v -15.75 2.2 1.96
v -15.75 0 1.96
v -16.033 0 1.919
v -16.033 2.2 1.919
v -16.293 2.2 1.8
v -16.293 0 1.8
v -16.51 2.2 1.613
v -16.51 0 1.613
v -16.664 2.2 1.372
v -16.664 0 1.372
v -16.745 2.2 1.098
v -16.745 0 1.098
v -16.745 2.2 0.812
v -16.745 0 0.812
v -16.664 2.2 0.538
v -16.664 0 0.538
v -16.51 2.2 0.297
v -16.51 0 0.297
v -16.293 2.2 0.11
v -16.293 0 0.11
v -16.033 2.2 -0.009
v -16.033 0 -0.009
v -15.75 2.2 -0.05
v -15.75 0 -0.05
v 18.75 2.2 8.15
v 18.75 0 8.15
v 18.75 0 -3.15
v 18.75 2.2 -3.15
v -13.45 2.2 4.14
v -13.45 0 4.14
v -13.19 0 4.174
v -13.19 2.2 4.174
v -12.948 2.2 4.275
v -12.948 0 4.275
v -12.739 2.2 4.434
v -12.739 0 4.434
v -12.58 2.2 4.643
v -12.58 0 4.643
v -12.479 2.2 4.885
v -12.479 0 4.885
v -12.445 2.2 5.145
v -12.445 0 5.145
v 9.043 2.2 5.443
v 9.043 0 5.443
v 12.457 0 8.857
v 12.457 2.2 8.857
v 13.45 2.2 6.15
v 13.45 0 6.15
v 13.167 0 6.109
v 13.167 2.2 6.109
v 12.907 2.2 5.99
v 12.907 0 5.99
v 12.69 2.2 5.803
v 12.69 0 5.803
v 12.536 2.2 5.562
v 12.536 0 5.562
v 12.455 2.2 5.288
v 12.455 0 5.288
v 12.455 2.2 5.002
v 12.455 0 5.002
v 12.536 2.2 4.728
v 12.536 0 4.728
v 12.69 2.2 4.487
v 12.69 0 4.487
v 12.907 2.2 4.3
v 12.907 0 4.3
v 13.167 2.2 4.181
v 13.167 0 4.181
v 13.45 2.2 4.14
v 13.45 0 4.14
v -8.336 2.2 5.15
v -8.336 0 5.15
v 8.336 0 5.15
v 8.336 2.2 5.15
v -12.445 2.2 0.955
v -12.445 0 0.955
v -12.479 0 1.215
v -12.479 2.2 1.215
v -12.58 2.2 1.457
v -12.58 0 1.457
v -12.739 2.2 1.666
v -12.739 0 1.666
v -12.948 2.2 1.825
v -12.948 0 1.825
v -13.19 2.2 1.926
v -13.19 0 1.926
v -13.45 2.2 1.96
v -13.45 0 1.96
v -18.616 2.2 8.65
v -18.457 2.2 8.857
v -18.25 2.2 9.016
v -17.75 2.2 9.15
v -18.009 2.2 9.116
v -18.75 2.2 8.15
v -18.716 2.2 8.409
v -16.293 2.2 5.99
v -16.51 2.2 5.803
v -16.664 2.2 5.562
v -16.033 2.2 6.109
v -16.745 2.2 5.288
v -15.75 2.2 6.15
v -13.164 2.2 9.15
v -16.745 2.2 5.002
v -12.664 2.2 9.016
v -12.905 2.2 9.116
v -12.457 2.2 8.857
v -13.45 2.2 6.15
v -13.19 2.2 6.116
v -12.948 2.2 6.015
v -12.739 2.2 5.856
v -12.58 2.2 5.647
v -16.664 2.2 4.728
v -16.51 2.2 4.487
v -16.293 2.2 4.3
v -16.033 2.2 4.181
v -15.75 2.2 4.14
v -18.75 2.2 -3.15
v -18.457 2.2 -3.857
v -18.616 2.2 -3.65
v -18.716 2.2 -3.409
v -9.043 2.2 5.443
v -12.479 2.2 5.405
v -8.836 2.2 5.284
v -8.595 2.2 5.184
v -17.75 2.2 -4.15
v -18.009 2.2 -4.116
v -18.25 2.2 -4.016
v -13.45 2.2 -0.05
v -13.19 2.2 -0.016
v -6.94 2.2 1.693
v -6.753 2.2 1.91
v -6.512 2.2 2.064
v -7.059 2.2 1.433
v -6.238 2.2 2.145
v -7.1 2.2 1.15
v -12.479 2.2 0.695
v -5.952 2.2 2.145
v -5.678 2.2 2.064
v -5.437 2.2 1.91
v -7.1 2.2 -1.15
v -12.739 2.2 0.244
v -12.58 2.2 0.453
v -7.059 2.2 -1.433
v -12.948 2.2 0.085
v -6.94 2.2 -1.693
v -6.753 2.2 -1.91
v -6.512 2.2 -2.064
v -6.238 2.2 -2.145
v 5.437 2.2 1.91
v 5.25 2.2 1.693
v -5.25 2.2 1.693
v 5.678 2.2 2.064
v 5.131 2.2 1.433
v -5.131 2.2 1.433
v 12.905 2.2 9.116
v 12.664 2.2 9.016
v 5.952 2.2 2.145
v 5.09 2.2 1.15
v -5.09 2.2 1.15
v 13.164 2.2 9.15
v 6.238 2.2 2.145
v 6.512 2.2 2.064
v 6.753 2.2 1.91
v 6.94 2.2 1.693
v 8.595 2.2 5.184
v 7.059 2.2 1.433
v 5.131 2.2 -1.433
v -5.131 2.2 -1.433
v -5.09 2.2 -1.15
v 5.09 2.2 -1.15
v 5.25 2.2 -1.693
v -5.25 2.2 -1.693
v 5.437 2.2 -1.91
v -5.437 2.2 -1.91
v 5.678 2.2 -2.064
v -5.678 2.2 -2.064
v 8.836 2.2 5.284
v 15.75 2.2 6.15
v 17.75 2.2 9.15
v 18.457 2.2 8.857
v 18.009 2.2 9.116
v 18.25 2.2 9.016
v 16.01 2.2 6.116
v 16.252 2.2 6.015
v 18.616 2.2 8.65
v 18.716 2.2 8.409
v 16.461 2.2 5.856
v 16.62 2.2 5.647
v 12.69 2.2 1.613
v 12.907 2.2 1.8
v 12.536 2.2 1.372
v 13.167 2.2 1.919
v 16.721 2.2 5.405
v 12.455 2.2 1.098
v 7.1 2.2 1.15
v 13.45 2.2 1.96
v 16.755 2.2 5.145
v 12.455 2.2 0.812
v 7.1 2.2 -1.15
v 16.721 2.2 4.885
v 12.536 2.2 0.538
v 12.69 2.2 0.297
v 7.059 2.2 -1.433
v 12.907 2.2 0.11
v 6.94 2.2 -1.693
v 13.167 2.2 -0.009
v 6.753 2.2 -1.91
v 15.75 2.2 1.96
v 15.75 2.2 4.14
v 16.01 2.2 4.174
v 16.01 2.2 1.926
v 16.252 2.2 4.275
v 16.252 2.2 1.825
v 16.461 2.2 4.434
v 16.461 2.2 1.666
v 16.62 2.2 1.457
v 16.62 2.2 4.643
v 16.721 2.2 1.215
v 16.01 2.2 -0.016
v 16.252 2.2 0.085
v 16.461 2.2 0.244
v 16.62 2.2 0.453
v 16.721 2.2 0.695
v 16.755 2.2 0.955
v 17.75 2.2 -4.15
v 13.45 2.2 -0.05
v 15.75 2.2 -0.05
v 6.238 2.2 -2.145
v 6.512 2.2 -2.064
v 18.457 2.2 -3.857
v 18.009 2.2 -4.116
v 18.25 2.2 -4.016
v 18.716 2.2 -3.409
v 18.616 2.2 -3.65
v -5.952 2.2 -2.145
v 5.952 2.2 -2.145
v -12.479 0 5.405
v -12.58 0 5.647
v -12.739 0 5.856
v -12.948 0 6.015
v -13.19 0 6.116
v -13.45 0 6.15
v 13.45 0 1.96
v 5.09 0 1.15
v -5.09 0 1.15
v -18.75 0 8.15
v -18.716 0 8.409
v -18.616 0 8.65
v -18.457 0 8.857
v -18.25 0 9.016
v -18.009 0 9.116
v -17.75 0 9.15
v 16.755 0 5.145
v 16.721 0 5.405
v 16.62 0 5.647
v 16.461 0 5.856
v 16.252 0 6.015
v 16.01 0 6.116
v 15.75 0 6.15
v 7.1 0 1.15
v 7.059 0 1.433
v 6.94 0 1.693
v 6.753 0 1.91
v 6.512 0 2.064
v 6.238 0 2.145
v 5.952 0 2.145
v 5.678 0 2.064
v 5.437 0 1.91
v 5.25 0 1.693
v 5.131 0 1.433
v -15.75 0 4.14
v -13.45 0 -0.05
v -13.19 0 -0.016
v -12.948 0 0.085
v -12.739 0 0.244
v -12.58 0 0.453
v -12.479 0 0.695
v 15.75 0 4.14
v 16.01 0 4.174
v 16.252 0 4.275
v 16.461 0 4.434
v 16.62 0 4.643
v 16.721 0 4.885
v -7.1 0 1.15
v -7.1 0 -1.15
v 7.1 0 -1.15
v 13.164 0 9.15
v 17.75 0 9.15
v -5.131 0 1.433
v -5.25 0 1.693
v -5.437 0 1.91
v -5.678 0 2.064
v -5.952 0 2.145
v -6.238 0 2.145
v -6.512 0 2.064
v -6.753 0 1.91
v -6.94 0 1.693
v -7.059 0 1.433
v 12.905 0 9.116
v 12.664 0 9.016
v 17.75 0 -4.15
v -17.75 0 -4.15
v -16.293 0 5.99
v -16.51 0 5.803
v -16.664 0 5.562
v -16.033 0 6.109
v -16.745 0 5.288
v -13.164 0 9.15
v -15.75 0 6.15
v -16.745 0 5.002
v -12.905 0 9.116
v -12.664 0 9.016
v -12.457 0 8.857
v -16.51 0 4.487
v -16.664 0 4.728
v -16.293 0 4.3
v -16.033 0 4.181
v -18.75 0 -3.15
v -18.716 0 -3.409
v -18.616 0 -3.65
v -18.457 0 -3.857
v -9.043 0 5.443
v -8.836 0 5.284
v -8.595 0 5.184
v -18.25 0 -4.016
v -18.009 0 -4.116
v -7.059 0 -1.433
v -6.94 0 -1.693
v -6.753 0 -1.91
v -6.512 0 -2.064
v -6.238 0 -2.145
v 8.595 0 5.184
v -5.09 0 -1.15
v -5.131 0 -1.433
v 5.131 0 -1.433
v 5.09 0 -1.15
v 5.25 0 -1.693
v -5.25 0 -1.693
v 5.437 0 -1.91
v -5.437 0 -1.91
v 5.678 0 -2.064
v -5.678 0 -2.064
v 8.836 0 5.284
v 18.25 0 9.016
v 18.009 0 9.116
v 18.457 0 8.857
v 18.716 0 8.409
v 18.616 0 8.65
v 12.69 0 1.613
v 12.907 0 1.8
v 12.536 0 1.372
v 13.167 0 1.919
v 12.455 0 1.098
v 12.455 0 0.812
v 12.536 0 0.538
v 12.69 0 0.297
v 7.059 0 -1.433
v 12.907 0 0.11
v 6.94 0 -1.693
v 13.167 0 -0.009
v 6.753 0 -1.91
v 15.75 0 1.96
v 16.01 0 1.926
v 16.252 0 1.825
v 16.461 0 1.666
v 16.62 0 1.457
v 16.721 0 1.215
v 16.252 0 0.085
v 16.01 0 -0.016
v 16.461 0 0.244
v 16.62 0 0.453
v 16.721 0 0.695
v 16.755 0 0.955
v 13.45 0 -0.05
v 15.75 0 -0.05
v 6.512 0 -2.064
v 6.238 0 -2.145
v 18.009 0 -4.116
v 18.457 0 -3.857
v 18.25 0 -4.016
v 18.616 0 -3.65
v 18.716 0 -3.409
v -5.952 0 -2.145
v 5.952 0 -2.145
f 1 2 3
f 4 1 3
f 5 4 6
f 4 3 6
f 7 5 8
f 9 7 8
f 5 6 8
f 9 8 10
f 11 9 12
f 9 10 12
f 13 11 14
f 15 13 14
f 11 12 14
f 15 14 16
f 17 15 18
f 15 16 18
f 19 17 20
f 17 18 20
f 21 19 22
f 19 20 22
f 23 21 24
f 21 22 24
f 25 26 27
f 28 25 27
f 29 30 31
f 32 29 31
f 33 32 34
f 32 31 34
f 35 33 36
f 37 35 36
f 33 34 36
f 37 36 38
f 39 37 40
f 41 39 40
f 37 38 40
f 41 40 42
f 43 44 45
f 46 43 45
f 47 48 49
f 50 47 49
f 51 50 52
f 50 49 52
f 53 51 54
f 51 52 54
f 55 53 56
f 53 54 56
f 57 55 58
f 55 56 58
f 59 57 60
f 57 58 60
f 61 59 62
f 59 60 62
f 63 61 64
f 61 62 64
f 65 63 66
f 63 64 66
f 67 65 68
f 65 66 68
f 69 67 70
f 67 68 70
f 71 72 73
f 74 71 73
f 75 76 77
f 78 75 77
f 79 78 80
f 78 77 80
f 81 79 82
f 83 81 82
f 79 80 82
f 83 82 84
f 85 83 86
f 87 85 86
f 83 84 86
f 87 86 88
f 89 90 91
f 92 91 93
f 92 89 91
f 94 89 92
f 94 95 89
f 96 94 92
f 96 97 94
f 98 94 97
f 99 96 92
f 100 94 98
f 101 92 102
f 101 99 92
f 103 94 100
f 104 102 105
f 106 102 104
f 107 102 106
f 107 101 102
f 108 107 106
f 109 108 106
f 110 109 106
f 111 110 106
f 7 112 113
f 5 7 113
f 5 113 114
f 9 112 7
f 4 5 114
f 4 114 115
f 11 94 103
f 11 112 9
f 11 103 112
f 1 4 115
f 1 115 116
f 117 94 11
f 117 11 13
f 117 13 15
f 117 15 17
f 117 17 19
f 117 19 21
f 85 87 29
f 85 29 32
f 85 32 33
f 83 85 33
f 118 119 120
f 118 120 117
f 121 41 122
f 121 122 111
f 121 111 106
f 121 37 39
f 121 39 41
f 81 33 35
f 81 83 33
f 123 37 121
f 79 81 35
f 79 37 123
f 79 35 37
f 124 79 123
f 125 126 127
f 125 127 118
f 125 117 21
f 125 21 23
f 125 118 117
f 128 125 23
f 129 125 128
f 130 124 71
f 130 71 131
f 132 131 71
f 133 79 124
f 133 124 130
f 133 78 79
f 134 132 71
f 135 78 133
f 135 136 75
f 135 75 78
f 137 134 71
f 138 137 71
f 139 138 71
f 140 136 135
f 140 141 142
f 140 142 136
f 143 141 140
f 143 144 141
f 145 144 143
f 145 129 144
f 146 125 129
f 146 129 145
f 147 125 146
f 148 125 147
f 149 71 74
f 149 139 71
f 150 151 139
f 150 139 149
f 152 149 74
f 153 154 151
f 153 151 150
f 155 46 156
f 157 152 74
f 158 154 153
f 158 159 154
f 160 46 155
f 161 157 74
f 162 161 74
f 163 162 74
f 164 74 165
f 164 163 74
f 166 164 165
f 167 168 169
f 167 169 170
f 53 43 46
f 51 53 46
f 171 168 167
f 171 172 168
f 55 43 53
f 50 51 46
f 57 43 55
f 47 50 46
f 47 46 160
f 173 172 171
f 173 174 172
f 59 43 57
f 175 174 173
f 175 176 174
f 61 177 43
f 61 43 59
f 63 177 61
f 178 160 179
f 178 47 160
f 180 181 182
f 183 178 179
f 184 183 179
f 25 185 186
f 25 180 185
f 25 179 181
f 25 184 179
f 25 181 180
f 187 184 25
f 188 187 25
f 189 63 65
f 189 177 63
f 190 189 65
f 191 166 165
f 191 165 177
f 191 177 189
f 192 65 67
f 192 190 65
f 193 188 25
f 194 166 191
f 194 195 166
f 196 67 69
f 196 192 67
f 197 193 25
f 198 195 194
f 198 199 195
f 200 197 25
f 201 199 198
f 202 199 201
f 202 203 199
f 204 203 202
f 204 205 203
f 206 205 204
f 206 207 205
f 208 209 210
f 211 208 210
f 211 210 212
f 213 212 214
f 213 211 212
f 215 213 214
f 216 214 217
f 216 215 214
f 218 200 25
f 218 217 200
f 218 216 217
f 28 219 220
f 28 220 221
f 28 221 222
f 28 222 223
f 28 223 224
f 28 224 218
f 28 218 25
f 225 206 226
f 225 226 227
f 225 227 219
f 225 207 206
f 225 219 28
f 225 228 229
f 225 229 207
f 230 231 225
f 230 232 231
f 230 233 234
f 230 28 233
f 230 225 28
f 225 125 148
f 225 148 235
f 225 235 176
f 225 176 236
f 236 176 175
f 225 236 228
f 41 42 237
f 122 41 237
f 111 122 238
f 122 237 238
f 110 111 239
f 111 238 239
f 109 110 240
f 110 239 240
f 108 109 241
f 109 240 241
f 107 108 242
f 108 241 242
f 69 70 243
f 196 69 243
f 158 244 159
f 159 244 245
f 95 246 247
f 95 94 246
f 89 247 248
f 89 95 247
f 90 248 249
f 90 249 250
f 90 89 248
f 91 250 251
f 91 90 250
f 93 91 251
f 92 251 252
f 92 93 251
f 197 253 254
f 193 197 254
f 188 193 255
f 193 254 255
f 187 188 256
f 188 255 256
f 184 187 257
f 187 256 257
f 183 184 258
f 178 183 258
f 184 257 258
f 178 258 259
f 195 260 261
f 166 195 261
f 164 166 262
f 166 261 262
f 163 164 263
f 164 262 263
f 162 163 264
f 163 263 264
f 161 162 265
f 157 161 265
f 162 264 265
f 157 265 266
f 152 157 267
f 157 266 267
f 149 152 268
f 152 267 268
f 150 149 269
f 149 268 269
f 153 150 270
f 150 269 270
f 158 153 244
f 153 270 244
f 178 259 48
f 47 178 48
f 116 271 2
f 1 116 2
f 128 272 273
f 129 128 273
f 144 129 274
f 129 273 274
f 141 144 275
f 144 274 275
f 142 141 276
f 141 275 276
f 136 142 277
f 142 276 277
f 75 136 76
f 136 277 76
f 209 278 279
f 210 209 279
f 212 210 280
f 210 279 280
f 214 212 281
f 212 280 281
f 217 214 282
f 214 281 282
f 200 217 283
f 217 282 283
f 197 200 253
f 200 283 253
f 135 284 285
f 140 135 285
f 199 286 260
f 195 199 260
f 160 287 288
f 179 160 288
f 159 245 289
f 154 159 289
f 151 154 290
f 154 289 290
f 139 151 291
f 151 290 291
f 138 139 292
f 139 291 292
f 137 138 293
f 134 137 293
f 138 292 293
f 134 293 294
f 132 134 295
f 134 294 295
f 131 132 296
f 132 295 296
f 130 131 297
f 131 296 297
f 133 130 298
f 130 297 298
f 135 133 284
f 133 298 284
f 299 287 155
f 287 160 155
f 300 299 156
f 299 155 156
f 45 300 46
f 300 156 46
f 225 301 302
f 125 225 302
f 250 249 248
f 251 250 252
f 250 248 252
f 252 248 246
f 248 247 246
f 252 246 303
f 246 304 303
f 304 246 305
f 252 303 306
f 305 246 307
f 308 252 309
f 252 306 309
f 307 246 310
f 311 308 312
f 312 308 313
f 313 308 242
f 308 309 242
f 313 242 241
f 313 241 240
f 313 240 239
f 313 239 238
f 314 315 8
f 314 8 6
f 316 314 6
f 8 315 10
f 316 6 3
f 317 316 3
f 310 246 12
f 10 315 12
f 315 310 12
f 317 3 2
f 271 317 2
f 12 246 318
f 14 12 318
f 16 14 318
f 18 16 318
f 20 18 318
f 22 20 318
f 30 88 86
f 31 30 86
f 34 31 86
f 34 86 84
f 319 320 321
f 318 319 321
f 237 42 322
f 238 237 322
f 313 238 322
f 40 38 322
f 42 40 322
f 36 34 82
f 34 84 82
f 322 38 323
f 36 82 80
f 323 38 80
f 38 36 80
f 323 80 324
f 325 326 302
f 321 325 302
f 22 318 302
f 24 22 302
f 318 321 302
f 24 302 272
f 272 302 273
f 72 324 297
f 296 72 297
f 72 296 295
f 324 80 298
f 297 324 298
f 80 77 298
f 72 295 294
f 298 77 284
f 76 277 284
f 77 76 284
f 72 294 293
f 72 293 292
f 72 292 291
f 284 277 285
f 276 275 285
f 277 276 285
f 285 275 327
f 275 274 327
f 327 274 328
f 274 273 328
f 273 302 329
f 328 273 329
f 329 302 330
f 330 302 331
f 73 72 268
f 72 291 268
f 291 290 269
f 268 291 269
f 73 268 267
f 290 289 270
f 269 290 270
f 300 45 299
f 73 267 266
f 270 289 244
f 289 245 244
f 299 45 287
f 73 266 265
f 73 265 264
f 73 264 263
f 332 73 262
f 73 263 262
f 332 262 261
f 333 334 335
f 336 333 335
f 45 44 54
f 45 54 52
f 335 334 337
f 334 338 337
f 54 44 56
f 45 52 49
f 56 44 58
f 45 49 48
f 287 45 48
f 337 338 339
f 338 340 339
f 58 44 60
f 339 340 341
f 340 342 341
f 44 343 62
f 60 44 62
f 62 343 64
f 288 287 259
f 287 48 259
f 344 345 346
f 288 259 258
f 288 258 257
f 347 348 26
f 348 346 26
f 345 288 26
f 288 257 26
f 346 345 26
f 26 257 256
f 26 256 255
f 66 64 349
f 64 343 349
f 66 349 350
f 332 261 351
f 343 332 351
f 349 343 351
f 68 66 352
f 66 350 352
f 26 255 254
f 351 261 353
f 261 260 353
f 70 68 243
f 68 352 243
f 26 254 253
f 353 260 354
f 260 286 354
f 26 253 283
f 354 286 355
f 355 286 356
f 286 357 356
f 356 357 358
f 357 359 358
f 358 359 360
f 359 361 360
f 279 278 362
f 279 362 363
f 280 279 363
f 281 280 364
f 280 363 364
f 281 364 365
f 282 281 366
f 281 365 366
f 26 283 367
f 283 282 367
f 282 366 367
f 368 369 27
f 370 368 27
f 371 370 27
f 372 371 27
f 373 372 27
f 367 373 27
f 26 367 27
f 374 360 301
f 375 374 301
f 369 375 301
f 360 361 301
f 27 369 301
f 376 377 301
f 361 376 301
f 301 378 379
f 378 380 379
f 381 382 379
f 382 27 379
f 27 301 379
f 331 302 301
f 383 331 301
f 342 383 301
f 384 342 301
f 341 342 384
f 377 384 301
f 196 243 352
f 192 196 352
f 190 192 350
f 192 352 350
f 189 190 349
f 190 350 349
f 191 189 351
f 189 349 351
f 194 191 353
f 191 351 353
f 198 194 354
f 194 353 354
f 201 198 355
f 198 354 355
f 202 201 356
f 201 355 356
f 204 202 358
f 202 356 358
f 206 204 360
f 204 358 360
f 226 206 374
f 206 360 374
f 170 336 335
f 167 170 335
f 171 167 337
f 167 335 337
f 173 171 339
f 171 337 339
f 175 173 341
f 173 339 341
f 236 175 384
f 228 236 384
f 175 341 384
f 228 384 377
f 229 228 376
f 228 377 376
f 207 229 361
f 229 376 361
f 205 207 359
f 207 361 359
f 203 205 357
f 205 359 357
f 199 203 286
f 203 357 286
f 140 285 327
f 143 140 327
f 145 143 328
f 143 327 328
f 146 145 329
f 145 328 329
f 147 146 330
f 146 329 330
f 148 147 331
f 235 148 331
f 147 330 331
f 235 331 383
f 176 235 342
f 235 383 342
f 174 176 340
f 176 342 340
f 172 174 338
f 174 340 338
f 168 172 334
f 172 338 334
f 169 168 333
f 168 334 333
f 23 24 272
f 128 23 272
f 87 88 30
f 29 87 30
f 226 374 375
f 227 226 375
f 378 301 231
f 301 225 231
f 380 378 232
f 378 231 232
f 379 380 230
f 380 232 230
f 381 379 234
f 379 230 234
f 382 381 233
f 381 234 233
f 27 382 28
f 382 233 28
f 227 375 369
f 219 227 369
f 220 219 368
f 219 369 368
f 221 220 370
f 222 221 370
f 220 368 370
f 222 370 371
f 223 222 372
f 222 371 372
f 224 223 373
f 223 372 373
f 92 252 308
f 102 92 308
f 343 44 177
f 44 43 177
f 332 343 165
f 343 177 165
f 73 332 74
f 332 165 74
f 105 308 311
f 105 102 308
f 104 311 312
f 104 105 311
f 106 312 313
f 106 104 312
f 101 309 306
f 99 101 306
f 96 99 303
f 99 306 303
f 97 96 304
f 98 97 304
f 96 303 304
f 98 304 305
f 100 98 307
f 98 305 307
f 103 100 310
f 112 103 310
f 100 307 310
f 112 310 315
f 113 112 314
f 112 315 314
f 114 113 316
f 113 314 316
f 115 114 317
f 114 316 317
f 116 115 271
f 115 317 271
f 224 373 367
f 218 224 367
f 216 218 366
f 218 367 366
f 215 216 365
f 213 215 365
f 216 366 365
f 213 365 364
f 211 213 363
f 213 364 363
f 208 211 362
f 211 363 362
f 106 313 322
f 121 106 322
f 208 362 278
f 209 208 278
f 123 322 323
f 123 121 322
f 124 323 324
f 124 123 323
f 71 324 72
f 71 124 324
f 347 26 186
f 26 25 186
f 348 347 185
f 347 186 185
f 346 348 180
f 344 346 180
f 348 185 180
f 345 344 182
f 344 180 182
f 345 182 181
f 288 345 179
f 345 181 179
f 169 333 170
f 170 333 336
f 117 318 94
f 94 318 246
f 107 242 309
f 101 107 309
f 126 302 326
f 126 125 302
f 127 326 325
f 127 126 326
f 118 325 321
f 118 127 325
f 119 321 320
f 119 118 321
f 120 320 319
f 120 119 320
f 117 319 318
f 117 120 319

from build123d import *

# Parameters (mm, degrees)
EXTRUDE_1_DEPTH = 2.2
FILLET_1_R      = 1


with BuildPart() as part:
    # 草图1 → 凸台-拉伸1 (new body)
    with BuildSketch(Plane(origin=(0, 0, 0), x_dir=(1, 0, 0), z_dir=(0, 1, 0))):
        Polygon((18.75, 4.15), (-18.75, 4.15), (-18.75, -9.15), (-12.75, -9.15), (-8.75, -5.15), (8.75, -5.15), (12.75, -9.15), (18.75, -9.15), align=None)
        with BuildLine():
            Line((-13.45, -6.15), (-15.75, -6.15))
            ThreePointArc((-15.75, -6.15), (-16.755, -5.145), (-15.75, -4.14))
            Line((-15.75, -4.14), (-15.75, -1.96))
            ThreePointArc((-15.75, -1.96), (-16.755, -0.955), (-15.75, 0.05))
            Line((-15.75, 0.05), (-13.45, 0.05))
            ThreePointArc((-13.45, 0.05), (-12.739357685, -0.244357685), (-12.445, -0.955))
            ThreePointArc((-12.445, -0.955), (-12.739357685, -1.665642315), (-13.45, -1.96))
            Line((-13.45, -1.96), (-13.45, -4.14))
            ThreePointArc((-13.45, -4.14), (-12.739357685, -4.434357685), (-12.445, -5.145))
            ThreePointArc((-12.445, -5.145), (-12.739357685, -5.855642315), (-13.45, -6.15))
        make_face(mode=Mode.SUBTRACT)
        with BuildLine():
            Line((13.45, 0.05), (15.75, 0.05))
            ThreePointArc((15.75, 0.05), (16.460642315, -0.244357685), (16.755, -0.955))
            ThreePointArc((16.755, -0.955), (16.460642315, -1.665642315), (15.75, -1.96))
            Line((15.75, -1.96), (15.75, -4.14))
            ThreePointArc((15.75, -4.14), (16.460642315, -4.434357685), (16.755, -5.145))
            ThreePointArc((16.755, -5.145), (16.460642315, -5.855642315), (15.75, -6.15))
            Line((15.75, -6.15), (13.45, -6.15))
            ThreePointArc((13.45, -6.15), (12.445, -5.145), (13.45, -4.14))
            Line((13.45, -4.14), (13.45, -1.96))
            ThreePointArc((13.45, -1.96), (12.445, -0.955), (13.45, 0.05))
        make_face(mode=Mode.SUBTRACT)
        with BuildLine():
            Line((5.09, -1.15), (-5.09, -1.15))
            ThreePointArc((-5.09, -1.15), (-6.095, -2.155), (-7.1, -1.15))
            Line((-7.1, -1.15), (-7.1, 1.15))
            ThreePointArc((-7.1, 1.15), (-6.095, 2.155), (-5.09, 1.15))
            Line((-5.09, 1.15), (5.09, 1.15))
            ThreePointArc((5.09, 1.15), (6.095, 2.155), (7.1, 1.15))
            Line((7.1, 1.15), (7.1, -1.15))
            ThreePointArc((7.1, -1.15), (6.095, -2.155), (5.09, -1.15))
        make_face(mode=Mode.SUBTRACT)
    extrude(amount=EXTRUDE_1_DEPTH)

    # 圆角1
    fillet_1_edges = [part.edges().sort_by_distance(p)[0] for p in [
        (-18.75, 1.1, 9.15),
        (-18.75, 1.1, -4.15),
        (18.75, 1.1, -4.15),
        (18.75, 1.1, 9.15),
        (12.75, 1.1, 9.15),
        (8.75, 1.1, 5.15),
        (-8.75, 1.1, 5.15),
        (-12.75, 1.1, 9.15),
    ]]
    fillet(fillet_1_edges, radius=FILLET_1_R)


solid = part.part
